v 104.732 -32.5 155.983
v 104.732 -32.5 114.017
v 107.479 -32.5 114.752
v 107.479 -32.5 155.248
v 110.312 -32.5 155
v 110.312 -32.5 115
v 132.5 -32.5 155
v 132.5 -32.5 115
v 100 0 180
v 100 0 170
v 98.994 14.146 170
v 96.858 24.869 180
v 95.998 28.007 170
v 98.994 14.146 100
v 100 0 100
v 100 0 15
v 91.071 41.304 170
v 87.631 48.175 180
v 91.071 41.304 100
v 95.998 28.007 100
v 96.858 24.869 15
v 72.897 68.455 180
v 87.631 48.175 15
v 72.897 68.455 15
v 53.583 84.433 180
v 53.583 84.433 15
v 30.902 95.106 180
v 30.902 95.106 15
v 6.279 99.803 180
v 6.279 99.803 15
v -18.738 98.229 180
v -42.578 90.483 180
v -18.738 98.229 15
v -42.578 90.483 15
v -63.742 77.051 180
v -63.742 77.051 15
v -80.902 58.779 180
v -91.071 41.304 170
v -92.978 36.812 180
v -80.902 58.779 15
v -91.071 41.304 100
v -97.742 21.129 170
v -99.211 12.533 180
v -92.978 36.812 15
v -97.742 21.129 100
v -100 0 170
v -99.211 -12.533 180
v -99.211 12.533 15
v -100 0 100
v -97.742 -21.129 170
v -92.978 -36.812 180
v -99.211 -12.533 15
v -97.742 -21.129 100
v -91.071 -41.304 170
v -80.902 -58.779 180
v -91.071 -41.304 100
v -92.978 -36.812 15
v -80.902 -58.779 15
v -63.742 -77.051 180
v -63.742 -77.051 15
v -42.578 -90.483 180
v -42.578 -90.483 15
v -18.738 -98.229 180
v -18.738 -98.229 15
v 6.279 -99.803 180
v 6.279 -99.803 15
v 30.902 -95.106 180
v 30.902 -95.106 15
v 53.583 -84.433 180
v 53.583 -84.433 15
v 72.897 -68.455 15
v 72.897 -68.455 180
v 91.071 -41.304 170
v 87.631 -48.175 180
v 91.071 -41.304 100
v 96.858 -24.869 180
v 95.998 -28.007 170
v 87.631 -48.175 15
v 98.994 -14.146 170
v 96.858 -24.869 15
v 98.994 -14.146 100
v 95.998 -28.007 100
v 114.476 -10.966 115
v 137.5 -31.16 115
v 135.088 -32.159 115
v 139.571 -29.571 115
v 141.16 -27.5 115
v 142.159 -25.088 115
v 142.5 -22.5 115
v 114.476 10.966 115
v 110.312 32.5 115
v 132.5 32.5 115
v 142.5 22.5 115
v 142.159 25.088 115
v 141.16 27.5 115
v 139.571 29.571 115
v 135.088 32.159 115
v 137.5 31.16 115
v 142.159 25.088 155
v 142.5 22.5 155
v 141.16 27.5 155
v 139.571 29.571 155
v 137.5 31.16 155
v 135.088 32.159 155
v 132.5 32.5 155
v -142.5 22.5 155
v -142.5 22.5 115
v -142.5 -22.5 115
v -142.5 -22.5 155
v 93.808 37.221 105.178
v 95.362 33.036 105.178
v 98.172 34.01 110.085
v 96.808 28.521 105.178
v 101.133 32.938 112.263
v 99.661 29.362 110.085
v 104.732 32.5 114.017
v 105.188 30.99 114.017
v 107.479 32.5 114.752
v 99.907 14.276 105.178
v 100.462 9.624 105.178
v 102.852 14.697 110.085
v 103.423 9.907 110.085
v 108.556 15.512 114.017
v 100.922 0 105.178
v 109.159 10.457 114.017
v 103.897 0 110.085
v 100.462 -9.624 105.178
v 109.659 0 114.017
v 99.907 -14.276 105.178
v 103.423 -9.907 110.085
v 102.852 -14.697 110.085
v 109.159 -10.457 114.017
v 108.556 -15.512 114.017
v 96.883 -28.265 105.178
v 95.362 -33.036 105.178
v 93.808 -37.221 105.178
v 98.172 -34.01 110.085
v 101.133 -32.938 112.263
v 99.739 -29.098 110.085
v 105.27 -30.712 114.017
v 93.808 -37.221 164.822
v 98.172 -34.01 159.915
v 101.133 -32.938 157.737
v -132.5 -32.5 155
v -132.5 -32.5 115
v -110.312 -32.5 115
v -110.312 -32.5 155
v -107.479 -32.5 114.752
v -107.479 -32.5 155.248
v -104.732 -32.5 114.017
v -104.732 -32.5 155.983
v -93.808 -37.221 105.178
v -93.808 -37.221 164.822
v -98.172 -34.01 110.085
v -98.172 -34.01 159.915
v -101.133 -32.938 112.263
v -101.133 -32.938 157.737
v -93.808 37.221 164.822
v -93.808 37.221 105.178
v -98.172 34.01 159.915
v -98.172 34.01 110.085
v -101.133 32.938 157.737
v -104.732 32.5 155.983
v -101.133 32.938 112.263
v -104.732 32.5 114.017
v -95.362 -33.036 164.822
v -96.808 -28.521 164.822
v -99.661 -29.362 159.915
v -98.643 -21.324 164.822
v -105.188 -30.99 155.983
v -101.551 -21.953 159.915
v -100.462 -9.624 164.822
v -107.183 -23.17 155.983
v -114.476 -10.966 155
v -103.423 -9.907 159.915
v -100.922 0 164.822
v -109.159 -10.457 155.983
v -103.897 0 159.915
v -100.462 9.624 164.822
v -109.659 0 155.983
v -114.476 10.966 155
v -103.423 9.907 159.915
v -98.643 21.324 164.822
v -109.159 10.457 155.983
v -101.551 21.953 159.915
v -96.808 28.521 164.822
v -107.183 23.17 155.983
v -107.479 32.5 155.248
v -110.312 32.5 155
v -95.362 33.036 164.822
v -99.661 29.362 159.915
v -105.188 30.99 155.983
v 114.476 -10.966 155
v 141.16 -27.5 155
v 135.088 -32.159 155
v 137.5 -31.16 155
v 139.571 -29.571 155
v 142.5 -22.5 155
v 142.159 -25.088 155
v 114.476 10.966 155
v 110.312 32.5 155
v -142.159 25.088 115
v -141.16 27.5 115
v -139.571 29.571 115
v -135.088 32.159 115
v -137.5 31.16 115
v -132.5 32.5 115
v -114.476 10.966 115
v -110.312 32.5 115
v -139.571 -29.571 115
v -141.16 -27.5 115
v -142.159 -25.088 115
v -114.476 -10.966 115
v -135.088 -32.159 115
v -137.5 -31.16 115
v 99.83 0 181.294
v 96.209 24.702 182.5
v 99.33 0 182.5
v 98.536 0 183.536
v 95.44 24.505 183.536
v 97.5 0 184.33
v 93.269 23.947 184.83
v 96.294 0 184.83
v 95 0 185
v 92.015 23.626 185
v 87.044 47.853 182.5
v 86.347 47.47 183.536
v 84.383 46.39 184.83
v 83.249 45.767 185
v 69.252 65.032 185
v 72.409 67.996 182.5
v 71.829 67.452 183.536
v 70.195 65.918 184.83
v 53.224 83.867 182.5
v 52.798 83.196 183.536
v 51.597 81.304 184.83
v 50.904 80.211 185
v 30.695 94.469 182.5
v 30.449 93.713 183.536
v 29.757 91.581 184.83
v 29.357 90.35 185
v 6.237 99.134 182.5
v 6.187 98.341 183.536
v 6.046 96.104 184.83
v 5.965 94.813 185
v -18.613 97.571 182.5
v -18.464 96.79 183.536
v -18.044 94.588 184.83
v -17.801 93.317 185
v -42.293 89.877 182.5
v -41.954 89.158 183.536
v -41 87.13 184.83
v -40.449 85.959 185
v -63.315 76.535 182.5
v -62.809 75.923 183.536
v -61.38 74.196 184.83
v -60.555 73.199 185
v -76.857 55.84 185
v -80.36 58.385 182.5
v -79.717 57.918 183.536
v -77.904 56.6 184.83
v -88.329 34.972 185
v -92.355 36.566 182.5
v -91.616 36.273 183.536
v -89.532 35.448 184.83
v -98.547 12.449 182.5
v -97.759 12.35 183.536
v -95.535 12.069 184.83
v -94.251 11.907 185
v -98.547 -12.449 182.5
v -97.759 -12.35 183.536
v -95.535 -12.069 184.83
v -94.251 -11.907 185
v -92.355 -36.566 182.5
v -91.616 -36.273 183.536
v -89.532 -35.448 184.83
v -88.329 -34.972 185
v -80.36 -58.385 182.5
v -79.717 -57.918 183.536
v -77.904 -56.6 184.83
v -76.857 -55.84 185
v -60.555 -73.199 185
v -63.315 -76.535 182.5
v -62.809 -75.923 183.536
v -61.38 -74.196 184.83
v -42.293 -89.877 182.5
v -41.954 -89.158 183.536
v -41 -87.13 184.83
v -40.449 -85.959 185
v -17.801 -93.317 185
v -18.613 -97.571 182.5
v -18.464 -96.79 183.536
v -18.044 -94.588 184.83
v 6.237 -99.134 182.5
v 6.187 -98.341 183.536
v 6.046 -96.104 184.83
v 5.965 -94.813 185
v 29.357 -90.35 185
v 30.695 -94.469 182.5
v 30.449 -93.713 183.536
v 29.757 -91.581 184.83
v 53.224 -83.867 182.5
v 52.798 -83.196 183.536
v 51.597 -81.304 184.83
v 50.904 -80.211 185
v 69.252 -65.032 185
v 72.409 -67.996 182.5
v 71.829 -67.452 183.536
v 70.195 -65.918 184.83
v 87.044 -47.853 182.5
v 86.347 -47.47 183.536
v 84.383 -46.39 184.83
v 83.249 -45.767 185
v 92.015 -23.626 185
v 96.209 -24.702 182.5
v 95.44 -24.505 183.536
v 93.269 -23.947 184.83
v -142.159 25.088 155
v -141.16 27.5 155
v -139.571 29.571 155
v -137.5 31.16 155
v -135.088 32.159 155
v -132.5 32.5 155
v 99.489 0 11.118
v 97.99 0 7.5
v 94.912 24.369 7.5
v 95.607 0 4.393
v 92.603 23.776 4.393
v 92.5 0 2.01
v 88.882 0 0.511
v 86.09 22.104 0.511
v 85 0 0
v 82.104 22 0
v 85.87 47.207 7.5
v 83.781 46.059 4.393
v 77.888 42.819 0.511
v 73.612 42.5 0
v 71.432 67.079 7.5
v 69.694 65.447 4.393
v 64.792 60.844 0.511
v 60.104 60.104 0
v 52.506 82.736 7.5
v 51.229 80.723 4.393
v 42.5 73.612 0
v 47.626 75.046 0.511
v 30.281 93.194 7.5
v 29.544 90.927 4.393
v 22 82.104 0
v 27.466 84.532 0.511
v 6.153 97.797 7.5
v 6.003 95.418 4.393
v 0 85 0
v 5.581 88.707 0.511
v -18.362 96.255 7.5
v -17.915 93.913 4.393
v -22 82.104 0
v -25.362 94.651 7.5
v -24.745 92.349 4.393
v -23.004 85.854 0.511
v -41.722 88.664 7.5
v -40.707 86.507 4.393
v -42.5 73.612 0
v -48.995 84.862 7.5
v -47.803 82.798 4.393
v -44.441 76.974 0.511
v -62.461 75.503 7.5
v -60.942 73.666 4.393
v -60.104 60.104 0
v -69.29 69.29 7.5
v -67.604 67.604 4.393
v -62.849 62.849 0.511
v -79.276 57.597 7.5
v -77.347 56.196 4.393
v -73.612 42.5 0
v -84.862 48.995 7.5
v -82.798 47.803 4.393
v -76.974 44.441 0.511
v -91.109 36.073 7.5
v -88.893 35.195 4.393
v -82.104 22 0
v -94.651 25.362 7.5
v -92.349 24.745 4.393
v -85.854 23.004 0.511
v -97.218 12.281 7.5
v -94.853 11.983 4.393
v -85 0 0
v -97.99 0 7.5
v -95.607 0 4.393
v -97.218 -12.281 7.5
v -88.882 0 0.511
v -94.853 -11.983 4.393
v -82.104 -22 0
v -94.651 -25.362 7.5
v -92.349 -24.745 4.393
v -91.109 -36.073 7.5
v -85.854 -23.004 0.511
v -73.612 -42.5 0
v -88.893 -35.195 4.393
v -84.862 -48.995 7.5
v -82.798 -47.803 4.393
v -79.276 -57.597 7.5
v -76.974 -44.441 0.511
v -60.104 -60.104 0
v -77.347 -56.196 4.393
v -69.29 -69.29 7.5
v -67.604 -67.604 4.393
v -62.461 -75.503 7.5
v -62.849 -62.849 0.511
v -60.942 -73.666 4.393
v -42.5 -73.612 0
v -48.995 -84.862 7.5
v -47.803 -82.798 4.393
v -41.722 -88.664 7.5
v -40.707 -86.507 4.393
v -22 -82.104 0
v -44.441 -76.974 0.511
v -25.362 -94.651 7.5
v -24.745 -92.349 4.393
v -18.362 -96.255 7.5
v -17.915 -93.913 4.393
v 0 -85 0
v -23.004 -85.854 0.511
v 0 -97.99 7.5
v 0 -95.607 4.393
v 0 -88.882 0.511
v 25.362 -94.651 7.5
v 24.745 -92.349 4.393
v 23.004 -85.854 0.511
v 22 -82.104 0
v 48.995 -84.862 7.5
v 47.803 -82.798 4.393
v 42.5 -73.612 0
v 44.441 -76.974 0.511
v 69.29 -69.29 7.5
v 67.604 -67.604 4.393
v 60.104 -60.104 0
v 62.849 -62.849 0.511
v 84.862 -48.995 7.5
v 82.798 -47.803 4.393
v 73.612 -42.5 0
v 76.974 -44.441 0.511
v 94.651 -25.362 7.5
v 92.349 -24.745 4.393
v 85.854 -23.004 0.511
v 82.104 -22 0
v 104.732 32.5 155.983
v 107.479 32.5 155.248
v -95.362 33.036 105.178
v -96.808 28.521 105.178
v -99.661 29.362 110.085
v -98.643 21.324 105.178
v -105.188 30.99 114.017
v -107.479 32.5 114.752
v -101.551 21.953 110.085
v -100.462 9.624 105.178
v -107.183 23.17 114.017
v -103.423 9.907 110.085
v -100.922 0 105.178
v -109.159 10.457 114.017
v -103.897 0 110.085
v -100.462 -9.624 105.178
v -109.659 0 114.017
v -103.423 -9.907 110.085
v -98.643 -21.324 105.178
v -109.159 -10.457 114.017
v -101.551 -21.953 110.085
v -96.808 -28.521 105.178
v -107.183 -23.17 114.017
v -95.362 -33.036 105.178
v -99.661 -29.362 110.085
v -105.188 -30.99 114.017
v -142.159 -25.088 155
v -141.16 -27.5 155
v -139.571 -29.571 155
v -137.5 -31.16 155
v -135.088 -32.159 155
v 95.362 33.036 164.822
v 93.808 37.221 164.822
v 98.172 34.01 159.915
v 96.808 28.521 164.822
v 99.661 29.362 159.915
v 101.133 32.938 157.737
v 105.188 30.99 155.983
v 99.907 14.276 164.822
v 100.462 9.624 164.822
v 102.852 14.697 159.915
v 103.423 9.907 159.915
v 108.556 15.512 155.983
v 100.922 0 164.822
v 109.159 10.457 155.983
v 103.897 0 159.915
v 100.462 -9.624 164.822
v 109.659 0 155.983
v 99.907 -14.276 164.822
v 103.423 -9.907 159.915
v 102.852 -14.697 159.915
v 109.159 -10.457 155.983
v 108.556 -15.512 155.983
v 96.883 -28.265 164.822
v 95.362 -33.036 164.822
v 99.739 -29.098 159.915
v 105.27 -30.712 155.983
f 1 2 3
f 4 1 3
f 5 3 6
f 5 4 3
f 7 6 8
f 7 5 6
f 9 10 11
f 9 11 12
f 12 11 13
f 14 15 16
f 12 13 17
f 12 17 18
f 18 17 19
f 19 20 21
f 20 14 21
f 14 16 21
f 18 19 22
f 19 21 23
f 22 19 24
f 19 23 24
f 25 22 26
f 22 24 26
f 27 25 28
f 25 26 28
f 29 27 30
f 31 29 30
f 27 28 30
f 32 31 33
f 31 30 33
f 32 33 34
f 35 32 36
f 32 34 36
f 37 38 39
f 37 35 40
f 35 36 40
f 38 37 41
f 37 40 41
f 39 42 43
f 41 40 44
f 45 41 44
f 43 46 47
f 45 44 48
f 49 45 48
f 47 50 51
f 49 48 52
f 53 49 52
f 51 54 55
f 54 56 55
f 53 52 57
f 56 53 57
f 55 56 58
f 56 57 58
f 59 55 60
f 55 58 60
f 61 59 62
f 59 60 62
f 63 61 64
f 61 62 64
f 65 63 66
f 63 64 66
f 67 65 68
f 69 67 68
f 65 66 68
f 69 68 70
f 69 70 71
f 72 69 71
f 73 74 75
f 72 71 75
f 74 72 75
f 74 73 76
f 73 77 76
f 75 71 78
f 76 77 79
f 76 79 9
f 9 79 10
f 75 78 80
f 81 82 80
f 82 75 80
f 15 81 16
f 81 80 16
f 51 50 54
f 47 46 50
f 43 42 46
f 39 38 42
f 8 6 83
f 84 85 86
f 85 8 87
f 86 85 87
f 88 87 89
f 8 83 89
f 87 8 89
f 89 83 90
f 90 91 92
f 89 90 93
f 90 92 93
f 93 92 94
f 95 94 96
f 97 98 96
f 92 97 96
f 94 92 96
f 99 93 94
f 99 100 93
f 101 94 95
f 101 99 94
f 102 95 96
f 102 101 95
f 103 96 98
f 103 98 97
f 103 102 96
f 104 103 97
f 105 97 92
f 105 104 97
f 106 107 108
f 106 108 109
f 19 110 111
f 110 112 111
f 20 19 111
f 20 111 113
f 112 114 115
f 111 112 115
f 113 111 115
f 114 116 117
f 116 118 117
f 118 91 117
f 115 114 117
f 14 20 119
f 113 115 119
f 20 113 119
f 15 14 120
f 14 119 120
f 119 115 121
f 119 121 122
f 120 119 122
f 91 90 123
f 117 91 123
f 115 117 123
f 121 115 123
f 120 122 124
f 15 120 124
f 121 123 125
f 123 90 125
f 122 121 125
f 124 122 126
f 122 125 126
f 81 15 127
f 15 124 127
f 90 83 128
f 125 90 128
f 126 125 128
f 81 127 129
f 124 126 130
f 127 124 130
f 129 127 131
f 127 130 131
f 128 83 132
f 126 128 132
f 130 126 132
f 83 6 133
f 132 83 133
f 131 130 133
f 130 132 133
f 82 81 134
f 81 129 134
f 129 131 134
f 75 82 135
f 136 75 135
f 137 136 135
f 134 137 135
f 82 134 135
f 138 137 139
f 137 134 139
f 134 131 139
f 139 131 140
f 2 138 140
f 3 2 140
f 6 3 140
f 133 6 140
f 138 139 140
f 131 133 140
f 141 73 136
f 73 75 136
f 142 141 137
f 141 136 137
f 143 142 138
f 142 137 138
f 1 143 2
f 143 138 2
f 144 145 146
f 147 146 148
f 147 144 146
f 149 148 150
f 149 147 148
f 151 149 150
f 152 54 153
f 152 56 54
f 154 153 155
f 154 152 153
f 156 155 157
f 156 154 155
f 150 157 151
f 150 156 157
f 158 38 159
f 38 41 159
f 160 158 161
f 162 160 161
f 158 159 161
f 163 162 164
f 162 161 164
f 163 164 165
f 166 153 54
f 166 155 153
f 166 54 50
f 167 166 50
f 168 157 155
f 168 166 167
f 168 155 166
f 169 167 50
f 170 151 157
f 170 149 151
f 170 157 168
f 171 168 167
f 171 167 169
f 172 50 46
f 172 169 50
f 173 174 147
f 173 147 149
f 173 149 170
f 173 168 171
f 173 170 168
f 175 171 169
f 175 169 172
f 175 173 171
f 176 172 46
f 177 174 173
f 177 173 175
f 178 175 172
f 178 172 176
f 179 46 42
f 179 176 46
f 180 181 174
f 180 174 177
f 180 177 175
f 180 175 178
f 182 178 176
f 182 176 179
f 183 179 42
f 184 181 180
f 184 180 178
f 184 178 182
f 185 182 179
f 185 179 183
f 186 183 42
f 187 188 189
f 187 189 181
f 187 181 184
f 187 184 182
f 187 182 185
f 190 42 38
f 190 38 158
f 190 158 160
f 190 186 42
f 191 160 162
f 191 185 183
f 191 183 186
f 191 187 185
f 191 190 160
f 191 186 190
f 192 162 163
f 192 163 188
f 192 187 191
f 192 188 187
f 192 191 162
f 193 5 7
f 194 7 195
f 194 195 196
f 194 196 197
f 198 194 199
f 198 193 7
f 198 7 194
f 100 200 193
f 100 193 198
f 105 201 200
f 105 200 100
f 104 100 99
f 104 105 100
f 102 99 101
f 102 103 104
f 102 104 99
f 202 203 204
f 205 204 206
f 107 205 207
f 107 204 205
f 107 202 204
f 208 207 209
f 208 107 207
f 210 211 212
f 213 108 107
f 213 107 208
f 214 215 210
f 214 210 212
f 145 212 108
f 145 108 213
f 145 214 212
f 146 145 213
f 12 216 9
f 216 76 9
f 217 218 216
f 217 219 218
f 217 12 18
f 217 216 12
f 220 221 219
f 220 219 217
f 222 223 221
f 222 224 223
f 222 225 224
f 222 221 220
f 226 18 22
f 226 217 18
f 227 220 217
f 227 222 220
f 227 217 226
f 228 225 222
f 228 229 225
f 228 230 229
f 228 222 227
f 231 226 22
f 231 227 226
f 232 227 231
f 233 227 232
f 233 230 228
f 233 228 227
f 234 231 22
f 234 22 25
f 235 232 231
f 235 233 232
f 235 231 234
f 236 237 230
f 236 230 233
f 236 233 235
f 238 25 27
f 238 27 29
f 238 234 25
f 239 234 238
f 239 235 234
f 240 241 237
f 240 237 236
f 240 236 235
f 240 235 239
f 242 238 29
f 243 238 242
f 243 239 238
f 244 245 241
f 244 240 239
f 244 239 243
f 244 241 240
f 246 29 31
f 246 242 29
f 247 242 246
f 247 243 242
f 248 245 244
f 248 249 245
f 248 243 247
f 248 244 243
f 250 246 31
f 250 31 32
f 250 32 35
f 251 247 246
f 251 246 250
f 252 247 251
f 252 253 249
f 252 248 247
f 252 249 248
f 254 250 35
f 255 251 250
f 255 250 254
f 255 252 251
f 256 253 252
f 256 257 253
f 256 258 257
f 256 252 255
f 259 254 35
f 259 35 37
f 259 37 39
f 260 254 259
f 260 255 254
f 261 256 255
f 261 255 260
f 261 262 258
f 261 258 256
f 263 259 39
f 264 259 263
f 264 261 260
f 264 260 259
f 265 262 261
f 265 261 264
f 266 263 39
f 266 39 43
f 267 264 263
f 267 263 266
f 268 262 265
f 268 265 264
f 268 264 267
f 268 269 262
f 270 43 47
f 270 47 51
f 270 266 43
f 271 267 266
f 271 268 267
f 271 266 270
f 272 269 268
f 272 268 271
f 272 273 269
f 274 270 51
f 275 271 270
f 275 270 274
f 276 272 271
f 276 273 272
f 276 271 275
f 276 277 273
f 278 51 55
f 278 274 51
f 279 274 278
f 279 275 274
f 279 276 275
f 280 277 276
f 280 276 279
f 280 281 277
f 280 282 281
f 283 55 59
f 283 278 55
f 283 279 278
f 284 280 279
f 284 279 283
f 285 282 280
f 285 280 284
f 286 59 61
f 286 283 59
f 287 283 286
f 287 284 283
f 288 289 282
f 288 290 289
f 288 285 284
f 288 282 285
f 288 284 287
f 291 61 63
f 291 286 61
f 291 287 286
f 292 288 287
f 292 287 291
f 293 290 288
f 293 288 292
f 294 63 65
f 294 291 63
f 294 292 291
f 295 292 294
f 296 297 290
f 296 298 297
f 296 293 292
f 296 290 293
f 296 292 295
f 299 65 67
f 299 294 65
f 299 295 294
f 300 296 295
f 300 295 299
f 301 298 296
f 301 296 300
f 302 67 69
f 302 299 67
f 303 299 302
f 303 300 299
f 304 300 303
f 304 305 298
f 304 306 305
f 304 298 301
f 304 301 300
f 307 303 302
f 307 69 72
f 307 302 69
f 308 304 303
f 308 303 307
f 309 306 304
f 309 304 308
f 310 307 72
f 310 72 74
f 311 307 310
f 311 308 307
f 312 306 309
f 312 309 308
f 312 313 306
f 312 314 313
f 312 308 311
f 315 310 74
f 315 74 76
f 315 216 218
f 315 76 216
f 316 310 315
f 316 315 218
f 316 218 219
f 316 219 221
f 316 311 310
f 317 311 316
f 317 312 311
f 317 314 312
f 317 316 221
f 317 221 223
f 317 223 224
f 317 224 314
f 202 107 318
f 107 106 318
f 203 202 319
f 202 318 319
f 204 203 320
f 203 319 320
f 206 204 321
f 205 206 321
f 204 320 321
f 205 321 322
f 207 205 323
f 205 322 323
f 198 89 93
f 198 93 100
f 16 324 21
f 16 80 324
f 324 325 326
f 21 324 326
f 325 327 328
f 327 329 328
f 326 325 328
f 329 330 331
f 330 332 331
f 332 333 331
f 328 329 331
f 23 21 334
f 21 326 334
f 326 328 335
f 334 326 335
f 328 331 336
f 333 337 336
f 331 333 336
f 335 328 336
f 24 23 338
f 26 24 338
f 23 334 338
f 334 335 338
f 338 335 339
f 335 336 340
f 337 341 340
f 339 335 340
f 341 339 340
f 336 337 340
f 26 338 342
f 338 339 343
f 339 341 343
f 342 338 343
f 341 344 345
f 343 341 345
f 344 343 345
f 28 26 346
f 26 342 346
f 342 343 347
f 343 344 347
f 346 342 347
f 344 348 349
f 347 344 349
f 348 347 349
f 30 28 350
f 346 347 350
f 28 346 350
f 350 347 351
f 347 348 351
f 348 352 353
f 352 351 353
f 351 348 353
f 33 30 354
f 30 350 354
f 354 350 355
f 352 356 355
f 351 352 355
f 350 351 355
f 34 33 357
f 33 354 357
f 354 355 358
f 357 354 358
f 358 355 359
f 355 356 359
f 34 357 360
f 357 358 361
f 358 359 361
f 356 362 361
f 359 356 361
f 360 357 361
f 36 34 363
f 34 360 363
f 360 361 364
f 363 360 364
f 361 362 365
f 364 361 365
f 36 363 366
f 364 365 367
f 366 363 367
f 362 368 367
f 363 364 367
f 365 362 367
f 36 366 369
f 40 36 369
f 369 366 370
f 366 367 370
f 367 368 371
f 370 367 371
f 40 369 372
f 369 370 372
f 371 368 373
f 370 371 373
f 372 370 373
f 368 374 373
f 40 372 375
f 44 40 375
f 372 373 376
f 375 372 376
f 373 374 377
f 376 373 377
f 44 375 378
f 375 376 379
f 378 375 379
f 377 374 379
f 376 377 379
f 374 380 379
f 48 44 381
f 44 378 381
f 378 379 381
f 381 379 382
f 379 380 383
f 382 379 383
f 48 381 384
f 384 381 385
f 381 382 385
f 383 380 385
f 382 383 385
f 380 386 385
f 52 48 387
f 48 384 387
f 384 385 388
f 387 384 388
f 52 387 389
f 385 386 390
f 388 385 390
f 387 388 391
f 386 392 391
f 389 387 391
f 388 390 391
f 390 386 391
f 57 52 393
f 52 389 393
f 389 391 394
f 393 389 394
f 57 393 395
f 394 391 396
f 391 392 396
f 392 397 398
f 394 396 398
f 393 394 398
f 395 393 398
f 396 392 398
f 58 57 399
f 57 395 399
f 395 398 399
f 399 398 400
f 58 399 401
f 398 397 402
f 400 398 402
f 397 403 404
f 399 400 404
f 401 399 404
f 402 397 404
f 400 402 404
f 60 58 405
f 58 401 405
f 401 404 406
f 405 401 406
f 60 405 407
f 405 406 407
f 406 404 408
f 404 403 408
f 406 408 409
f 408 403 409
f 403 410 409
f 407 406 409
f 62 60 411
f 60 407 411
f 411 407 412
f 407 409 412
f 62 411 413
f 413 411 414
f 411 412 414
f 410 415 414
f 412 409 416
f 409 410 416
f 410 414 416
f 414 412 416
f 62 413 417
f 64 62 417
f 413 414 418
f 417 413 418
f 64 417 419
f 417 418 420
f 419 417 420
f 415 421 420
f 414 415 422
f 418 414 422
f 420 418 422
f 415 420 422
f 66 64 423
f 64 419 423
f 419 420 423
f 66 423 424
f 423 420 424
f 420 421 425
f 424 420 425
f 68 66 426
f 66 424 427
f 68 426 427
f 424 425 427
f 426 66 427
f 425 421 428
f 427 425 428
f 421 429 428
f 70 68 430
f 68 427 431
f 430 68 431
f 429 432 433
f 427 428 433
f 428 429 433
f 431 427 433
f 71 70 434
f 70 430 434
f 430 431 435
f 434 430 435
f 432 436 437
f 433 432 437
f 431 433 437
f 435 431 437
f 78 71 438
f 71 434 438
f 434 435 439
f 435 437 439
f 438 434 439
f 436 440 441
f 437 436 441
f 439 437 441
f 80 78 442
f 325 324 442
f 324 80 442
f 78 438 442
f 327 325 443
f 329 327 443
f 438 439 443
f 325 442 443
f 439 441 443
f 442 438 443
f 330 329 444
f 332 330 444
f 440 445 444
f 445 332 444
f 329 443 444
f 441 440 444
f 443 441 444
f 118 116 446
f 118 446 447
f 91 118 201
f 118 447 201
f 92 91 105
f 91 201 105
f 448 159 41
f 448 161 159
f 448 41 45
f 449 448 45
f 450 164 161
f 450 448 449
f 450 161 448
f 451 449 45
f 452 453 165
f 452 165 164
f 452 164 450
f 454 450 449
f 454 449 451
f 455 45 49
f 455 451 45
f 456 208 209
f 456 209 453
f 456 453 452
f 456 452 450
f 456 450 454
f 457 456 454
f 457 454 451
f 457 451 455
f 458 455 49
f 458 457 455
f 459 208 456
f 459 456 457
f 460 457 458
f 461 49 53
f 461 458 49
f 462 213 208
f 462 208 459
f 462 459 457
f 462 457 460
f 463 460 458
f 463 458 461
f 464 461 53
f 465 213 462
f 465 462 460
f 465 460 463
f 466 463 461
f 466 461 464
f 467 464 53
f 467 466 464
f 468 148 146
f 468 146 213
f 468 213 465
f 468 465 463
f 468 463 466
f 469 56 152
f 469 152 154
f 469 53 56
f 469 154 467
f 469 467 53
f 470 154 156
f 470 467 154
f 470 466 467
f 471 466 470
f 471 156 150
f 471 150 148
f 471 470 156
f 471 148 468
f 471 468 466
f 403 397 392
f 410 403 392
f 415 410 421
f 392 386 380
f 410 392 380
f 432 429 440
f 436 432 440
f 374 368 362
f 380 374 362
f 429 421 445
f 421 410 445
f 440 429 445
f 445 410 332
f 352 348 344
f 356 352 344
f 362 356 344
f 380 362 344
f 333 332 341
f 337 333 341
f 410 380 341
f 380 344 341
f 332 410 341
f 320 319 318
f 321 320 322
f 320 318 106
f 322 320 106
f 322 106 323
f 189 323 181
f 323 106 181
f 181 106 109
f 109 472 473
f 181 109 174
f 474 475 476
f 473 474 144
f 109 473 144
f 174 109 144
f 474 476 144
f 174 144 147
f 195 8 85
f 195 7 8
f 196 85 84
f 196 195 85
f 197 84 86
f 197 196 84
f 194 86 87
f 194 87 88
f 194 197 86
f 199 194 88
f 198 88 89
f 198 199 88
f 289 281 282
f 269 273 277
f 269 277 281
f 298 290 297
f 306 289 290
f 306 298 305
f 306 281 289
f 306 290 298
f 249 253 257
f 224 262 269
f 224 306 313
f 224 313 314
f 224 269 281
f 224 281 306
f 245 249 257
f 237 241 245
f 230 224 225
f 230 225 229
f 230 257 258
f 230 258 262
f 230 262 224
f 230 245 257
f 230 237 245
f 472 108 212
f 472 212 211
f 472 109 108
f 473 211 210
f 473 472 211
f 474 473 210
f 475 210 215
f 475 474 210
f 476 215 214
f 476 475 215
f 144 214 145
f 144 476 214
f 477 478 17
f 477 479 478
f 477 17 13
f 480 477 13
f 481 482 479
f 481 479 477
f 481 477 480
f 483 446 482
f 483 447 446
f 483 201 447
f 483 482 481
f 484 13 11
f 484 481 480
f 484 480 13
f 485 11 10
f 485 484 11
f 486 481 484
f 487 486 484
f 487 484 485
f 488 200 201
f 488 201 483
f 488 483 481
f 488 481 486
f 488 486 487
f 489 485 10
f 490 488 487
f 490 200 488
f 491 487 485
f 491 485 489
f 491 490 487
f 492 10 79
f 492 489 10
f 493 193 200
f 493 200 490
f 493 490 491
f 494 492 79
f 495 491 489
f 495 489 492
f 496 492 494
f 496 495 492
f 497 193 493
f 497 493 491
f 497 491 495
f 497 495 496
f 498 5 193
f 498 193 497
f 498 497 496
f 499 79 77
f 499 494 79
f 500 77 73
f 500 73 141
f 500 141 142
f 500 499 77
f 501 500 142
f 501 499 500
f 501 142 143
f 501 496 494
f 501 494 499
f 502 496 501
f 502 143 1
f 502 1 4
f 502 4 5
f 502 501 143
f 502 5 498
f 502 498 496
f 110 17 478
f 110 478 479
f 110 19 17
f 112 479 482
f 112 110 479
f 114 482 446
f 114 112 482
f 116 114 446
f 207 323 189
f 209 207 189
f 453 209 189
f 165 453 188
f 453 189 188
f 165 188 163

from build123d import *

# Parameters (mm, degrees)
F0_R          = 100
F1_DEPTH      = 185
F2_W          = 62.5
F2_H          = 40
F3_DEPTH      = 32.5
F3_DEPTH_BACK = 32.5
F4_R          = 10
F5_R          = 5
F6_R          = 15


with BuildPart() as f1:
    # F0 (on Top) → F1 (new body)
    with BuildSketch(Plane.XY):
        Circle(F0_R)
    extrude(amount=F1_DEPTH)

    # F2 (on Front) → F3 (join, two sides)
    with BuildSketch(Plane.XZ) as f3_sk:
        with Locations((-111.25, 135)):
            Rectangle(F2_W, F2_H)
        with Locations((111.25, 135)):
            Rectangle(F2_W, F2_H)
    extrude(amount=F3_DEPTH)
    extrude(f3_sk.sketch, amount=-F3_DEPTH_BACK)

    # F4
    f4_edges = [f1.edges().sort_by_distance(p)[0] for p in [
        (-142.5, -32.5, 135),
        (-142.5, 32.5, 135),
        (142.5, -32.5, 135),
        (142.5, 32.5, 135),
    ]]
    fillet(f4_edges, radius=F4_R)

    # F5
    f5_edges = [f1.edges().sort_by_distance(p)[0] for p in [
        (-100, 0, 185),
    ]]
    fillet(f5_edges, radius=F5_R)

    # F6
    f6_edges = [f1.edges().sort_by_distance(p)[0] for p in [
        (100, 0, 167.5),
        (-100, 0, 180),
        (98.633514, -16.47513, 155),
        (94.571402, -32.5, 135),
        (98.633514, 16.47513, 155),
        (98.633514, -16.47513, 115),
        (94.571402, 32.5, 135),
        (100, 0, 57.5),
        (98.633514, 16.47513, 115),
        (-100, 0, 0),
        (-94.571402, -32.5, 135),
        (-100, 0, 115),
        (-94.571402, 32.5, 135),
        (-100, 0, 155),
    ]]
    fillet(f6_edges, radius=F6_R)


solid = f1.part
